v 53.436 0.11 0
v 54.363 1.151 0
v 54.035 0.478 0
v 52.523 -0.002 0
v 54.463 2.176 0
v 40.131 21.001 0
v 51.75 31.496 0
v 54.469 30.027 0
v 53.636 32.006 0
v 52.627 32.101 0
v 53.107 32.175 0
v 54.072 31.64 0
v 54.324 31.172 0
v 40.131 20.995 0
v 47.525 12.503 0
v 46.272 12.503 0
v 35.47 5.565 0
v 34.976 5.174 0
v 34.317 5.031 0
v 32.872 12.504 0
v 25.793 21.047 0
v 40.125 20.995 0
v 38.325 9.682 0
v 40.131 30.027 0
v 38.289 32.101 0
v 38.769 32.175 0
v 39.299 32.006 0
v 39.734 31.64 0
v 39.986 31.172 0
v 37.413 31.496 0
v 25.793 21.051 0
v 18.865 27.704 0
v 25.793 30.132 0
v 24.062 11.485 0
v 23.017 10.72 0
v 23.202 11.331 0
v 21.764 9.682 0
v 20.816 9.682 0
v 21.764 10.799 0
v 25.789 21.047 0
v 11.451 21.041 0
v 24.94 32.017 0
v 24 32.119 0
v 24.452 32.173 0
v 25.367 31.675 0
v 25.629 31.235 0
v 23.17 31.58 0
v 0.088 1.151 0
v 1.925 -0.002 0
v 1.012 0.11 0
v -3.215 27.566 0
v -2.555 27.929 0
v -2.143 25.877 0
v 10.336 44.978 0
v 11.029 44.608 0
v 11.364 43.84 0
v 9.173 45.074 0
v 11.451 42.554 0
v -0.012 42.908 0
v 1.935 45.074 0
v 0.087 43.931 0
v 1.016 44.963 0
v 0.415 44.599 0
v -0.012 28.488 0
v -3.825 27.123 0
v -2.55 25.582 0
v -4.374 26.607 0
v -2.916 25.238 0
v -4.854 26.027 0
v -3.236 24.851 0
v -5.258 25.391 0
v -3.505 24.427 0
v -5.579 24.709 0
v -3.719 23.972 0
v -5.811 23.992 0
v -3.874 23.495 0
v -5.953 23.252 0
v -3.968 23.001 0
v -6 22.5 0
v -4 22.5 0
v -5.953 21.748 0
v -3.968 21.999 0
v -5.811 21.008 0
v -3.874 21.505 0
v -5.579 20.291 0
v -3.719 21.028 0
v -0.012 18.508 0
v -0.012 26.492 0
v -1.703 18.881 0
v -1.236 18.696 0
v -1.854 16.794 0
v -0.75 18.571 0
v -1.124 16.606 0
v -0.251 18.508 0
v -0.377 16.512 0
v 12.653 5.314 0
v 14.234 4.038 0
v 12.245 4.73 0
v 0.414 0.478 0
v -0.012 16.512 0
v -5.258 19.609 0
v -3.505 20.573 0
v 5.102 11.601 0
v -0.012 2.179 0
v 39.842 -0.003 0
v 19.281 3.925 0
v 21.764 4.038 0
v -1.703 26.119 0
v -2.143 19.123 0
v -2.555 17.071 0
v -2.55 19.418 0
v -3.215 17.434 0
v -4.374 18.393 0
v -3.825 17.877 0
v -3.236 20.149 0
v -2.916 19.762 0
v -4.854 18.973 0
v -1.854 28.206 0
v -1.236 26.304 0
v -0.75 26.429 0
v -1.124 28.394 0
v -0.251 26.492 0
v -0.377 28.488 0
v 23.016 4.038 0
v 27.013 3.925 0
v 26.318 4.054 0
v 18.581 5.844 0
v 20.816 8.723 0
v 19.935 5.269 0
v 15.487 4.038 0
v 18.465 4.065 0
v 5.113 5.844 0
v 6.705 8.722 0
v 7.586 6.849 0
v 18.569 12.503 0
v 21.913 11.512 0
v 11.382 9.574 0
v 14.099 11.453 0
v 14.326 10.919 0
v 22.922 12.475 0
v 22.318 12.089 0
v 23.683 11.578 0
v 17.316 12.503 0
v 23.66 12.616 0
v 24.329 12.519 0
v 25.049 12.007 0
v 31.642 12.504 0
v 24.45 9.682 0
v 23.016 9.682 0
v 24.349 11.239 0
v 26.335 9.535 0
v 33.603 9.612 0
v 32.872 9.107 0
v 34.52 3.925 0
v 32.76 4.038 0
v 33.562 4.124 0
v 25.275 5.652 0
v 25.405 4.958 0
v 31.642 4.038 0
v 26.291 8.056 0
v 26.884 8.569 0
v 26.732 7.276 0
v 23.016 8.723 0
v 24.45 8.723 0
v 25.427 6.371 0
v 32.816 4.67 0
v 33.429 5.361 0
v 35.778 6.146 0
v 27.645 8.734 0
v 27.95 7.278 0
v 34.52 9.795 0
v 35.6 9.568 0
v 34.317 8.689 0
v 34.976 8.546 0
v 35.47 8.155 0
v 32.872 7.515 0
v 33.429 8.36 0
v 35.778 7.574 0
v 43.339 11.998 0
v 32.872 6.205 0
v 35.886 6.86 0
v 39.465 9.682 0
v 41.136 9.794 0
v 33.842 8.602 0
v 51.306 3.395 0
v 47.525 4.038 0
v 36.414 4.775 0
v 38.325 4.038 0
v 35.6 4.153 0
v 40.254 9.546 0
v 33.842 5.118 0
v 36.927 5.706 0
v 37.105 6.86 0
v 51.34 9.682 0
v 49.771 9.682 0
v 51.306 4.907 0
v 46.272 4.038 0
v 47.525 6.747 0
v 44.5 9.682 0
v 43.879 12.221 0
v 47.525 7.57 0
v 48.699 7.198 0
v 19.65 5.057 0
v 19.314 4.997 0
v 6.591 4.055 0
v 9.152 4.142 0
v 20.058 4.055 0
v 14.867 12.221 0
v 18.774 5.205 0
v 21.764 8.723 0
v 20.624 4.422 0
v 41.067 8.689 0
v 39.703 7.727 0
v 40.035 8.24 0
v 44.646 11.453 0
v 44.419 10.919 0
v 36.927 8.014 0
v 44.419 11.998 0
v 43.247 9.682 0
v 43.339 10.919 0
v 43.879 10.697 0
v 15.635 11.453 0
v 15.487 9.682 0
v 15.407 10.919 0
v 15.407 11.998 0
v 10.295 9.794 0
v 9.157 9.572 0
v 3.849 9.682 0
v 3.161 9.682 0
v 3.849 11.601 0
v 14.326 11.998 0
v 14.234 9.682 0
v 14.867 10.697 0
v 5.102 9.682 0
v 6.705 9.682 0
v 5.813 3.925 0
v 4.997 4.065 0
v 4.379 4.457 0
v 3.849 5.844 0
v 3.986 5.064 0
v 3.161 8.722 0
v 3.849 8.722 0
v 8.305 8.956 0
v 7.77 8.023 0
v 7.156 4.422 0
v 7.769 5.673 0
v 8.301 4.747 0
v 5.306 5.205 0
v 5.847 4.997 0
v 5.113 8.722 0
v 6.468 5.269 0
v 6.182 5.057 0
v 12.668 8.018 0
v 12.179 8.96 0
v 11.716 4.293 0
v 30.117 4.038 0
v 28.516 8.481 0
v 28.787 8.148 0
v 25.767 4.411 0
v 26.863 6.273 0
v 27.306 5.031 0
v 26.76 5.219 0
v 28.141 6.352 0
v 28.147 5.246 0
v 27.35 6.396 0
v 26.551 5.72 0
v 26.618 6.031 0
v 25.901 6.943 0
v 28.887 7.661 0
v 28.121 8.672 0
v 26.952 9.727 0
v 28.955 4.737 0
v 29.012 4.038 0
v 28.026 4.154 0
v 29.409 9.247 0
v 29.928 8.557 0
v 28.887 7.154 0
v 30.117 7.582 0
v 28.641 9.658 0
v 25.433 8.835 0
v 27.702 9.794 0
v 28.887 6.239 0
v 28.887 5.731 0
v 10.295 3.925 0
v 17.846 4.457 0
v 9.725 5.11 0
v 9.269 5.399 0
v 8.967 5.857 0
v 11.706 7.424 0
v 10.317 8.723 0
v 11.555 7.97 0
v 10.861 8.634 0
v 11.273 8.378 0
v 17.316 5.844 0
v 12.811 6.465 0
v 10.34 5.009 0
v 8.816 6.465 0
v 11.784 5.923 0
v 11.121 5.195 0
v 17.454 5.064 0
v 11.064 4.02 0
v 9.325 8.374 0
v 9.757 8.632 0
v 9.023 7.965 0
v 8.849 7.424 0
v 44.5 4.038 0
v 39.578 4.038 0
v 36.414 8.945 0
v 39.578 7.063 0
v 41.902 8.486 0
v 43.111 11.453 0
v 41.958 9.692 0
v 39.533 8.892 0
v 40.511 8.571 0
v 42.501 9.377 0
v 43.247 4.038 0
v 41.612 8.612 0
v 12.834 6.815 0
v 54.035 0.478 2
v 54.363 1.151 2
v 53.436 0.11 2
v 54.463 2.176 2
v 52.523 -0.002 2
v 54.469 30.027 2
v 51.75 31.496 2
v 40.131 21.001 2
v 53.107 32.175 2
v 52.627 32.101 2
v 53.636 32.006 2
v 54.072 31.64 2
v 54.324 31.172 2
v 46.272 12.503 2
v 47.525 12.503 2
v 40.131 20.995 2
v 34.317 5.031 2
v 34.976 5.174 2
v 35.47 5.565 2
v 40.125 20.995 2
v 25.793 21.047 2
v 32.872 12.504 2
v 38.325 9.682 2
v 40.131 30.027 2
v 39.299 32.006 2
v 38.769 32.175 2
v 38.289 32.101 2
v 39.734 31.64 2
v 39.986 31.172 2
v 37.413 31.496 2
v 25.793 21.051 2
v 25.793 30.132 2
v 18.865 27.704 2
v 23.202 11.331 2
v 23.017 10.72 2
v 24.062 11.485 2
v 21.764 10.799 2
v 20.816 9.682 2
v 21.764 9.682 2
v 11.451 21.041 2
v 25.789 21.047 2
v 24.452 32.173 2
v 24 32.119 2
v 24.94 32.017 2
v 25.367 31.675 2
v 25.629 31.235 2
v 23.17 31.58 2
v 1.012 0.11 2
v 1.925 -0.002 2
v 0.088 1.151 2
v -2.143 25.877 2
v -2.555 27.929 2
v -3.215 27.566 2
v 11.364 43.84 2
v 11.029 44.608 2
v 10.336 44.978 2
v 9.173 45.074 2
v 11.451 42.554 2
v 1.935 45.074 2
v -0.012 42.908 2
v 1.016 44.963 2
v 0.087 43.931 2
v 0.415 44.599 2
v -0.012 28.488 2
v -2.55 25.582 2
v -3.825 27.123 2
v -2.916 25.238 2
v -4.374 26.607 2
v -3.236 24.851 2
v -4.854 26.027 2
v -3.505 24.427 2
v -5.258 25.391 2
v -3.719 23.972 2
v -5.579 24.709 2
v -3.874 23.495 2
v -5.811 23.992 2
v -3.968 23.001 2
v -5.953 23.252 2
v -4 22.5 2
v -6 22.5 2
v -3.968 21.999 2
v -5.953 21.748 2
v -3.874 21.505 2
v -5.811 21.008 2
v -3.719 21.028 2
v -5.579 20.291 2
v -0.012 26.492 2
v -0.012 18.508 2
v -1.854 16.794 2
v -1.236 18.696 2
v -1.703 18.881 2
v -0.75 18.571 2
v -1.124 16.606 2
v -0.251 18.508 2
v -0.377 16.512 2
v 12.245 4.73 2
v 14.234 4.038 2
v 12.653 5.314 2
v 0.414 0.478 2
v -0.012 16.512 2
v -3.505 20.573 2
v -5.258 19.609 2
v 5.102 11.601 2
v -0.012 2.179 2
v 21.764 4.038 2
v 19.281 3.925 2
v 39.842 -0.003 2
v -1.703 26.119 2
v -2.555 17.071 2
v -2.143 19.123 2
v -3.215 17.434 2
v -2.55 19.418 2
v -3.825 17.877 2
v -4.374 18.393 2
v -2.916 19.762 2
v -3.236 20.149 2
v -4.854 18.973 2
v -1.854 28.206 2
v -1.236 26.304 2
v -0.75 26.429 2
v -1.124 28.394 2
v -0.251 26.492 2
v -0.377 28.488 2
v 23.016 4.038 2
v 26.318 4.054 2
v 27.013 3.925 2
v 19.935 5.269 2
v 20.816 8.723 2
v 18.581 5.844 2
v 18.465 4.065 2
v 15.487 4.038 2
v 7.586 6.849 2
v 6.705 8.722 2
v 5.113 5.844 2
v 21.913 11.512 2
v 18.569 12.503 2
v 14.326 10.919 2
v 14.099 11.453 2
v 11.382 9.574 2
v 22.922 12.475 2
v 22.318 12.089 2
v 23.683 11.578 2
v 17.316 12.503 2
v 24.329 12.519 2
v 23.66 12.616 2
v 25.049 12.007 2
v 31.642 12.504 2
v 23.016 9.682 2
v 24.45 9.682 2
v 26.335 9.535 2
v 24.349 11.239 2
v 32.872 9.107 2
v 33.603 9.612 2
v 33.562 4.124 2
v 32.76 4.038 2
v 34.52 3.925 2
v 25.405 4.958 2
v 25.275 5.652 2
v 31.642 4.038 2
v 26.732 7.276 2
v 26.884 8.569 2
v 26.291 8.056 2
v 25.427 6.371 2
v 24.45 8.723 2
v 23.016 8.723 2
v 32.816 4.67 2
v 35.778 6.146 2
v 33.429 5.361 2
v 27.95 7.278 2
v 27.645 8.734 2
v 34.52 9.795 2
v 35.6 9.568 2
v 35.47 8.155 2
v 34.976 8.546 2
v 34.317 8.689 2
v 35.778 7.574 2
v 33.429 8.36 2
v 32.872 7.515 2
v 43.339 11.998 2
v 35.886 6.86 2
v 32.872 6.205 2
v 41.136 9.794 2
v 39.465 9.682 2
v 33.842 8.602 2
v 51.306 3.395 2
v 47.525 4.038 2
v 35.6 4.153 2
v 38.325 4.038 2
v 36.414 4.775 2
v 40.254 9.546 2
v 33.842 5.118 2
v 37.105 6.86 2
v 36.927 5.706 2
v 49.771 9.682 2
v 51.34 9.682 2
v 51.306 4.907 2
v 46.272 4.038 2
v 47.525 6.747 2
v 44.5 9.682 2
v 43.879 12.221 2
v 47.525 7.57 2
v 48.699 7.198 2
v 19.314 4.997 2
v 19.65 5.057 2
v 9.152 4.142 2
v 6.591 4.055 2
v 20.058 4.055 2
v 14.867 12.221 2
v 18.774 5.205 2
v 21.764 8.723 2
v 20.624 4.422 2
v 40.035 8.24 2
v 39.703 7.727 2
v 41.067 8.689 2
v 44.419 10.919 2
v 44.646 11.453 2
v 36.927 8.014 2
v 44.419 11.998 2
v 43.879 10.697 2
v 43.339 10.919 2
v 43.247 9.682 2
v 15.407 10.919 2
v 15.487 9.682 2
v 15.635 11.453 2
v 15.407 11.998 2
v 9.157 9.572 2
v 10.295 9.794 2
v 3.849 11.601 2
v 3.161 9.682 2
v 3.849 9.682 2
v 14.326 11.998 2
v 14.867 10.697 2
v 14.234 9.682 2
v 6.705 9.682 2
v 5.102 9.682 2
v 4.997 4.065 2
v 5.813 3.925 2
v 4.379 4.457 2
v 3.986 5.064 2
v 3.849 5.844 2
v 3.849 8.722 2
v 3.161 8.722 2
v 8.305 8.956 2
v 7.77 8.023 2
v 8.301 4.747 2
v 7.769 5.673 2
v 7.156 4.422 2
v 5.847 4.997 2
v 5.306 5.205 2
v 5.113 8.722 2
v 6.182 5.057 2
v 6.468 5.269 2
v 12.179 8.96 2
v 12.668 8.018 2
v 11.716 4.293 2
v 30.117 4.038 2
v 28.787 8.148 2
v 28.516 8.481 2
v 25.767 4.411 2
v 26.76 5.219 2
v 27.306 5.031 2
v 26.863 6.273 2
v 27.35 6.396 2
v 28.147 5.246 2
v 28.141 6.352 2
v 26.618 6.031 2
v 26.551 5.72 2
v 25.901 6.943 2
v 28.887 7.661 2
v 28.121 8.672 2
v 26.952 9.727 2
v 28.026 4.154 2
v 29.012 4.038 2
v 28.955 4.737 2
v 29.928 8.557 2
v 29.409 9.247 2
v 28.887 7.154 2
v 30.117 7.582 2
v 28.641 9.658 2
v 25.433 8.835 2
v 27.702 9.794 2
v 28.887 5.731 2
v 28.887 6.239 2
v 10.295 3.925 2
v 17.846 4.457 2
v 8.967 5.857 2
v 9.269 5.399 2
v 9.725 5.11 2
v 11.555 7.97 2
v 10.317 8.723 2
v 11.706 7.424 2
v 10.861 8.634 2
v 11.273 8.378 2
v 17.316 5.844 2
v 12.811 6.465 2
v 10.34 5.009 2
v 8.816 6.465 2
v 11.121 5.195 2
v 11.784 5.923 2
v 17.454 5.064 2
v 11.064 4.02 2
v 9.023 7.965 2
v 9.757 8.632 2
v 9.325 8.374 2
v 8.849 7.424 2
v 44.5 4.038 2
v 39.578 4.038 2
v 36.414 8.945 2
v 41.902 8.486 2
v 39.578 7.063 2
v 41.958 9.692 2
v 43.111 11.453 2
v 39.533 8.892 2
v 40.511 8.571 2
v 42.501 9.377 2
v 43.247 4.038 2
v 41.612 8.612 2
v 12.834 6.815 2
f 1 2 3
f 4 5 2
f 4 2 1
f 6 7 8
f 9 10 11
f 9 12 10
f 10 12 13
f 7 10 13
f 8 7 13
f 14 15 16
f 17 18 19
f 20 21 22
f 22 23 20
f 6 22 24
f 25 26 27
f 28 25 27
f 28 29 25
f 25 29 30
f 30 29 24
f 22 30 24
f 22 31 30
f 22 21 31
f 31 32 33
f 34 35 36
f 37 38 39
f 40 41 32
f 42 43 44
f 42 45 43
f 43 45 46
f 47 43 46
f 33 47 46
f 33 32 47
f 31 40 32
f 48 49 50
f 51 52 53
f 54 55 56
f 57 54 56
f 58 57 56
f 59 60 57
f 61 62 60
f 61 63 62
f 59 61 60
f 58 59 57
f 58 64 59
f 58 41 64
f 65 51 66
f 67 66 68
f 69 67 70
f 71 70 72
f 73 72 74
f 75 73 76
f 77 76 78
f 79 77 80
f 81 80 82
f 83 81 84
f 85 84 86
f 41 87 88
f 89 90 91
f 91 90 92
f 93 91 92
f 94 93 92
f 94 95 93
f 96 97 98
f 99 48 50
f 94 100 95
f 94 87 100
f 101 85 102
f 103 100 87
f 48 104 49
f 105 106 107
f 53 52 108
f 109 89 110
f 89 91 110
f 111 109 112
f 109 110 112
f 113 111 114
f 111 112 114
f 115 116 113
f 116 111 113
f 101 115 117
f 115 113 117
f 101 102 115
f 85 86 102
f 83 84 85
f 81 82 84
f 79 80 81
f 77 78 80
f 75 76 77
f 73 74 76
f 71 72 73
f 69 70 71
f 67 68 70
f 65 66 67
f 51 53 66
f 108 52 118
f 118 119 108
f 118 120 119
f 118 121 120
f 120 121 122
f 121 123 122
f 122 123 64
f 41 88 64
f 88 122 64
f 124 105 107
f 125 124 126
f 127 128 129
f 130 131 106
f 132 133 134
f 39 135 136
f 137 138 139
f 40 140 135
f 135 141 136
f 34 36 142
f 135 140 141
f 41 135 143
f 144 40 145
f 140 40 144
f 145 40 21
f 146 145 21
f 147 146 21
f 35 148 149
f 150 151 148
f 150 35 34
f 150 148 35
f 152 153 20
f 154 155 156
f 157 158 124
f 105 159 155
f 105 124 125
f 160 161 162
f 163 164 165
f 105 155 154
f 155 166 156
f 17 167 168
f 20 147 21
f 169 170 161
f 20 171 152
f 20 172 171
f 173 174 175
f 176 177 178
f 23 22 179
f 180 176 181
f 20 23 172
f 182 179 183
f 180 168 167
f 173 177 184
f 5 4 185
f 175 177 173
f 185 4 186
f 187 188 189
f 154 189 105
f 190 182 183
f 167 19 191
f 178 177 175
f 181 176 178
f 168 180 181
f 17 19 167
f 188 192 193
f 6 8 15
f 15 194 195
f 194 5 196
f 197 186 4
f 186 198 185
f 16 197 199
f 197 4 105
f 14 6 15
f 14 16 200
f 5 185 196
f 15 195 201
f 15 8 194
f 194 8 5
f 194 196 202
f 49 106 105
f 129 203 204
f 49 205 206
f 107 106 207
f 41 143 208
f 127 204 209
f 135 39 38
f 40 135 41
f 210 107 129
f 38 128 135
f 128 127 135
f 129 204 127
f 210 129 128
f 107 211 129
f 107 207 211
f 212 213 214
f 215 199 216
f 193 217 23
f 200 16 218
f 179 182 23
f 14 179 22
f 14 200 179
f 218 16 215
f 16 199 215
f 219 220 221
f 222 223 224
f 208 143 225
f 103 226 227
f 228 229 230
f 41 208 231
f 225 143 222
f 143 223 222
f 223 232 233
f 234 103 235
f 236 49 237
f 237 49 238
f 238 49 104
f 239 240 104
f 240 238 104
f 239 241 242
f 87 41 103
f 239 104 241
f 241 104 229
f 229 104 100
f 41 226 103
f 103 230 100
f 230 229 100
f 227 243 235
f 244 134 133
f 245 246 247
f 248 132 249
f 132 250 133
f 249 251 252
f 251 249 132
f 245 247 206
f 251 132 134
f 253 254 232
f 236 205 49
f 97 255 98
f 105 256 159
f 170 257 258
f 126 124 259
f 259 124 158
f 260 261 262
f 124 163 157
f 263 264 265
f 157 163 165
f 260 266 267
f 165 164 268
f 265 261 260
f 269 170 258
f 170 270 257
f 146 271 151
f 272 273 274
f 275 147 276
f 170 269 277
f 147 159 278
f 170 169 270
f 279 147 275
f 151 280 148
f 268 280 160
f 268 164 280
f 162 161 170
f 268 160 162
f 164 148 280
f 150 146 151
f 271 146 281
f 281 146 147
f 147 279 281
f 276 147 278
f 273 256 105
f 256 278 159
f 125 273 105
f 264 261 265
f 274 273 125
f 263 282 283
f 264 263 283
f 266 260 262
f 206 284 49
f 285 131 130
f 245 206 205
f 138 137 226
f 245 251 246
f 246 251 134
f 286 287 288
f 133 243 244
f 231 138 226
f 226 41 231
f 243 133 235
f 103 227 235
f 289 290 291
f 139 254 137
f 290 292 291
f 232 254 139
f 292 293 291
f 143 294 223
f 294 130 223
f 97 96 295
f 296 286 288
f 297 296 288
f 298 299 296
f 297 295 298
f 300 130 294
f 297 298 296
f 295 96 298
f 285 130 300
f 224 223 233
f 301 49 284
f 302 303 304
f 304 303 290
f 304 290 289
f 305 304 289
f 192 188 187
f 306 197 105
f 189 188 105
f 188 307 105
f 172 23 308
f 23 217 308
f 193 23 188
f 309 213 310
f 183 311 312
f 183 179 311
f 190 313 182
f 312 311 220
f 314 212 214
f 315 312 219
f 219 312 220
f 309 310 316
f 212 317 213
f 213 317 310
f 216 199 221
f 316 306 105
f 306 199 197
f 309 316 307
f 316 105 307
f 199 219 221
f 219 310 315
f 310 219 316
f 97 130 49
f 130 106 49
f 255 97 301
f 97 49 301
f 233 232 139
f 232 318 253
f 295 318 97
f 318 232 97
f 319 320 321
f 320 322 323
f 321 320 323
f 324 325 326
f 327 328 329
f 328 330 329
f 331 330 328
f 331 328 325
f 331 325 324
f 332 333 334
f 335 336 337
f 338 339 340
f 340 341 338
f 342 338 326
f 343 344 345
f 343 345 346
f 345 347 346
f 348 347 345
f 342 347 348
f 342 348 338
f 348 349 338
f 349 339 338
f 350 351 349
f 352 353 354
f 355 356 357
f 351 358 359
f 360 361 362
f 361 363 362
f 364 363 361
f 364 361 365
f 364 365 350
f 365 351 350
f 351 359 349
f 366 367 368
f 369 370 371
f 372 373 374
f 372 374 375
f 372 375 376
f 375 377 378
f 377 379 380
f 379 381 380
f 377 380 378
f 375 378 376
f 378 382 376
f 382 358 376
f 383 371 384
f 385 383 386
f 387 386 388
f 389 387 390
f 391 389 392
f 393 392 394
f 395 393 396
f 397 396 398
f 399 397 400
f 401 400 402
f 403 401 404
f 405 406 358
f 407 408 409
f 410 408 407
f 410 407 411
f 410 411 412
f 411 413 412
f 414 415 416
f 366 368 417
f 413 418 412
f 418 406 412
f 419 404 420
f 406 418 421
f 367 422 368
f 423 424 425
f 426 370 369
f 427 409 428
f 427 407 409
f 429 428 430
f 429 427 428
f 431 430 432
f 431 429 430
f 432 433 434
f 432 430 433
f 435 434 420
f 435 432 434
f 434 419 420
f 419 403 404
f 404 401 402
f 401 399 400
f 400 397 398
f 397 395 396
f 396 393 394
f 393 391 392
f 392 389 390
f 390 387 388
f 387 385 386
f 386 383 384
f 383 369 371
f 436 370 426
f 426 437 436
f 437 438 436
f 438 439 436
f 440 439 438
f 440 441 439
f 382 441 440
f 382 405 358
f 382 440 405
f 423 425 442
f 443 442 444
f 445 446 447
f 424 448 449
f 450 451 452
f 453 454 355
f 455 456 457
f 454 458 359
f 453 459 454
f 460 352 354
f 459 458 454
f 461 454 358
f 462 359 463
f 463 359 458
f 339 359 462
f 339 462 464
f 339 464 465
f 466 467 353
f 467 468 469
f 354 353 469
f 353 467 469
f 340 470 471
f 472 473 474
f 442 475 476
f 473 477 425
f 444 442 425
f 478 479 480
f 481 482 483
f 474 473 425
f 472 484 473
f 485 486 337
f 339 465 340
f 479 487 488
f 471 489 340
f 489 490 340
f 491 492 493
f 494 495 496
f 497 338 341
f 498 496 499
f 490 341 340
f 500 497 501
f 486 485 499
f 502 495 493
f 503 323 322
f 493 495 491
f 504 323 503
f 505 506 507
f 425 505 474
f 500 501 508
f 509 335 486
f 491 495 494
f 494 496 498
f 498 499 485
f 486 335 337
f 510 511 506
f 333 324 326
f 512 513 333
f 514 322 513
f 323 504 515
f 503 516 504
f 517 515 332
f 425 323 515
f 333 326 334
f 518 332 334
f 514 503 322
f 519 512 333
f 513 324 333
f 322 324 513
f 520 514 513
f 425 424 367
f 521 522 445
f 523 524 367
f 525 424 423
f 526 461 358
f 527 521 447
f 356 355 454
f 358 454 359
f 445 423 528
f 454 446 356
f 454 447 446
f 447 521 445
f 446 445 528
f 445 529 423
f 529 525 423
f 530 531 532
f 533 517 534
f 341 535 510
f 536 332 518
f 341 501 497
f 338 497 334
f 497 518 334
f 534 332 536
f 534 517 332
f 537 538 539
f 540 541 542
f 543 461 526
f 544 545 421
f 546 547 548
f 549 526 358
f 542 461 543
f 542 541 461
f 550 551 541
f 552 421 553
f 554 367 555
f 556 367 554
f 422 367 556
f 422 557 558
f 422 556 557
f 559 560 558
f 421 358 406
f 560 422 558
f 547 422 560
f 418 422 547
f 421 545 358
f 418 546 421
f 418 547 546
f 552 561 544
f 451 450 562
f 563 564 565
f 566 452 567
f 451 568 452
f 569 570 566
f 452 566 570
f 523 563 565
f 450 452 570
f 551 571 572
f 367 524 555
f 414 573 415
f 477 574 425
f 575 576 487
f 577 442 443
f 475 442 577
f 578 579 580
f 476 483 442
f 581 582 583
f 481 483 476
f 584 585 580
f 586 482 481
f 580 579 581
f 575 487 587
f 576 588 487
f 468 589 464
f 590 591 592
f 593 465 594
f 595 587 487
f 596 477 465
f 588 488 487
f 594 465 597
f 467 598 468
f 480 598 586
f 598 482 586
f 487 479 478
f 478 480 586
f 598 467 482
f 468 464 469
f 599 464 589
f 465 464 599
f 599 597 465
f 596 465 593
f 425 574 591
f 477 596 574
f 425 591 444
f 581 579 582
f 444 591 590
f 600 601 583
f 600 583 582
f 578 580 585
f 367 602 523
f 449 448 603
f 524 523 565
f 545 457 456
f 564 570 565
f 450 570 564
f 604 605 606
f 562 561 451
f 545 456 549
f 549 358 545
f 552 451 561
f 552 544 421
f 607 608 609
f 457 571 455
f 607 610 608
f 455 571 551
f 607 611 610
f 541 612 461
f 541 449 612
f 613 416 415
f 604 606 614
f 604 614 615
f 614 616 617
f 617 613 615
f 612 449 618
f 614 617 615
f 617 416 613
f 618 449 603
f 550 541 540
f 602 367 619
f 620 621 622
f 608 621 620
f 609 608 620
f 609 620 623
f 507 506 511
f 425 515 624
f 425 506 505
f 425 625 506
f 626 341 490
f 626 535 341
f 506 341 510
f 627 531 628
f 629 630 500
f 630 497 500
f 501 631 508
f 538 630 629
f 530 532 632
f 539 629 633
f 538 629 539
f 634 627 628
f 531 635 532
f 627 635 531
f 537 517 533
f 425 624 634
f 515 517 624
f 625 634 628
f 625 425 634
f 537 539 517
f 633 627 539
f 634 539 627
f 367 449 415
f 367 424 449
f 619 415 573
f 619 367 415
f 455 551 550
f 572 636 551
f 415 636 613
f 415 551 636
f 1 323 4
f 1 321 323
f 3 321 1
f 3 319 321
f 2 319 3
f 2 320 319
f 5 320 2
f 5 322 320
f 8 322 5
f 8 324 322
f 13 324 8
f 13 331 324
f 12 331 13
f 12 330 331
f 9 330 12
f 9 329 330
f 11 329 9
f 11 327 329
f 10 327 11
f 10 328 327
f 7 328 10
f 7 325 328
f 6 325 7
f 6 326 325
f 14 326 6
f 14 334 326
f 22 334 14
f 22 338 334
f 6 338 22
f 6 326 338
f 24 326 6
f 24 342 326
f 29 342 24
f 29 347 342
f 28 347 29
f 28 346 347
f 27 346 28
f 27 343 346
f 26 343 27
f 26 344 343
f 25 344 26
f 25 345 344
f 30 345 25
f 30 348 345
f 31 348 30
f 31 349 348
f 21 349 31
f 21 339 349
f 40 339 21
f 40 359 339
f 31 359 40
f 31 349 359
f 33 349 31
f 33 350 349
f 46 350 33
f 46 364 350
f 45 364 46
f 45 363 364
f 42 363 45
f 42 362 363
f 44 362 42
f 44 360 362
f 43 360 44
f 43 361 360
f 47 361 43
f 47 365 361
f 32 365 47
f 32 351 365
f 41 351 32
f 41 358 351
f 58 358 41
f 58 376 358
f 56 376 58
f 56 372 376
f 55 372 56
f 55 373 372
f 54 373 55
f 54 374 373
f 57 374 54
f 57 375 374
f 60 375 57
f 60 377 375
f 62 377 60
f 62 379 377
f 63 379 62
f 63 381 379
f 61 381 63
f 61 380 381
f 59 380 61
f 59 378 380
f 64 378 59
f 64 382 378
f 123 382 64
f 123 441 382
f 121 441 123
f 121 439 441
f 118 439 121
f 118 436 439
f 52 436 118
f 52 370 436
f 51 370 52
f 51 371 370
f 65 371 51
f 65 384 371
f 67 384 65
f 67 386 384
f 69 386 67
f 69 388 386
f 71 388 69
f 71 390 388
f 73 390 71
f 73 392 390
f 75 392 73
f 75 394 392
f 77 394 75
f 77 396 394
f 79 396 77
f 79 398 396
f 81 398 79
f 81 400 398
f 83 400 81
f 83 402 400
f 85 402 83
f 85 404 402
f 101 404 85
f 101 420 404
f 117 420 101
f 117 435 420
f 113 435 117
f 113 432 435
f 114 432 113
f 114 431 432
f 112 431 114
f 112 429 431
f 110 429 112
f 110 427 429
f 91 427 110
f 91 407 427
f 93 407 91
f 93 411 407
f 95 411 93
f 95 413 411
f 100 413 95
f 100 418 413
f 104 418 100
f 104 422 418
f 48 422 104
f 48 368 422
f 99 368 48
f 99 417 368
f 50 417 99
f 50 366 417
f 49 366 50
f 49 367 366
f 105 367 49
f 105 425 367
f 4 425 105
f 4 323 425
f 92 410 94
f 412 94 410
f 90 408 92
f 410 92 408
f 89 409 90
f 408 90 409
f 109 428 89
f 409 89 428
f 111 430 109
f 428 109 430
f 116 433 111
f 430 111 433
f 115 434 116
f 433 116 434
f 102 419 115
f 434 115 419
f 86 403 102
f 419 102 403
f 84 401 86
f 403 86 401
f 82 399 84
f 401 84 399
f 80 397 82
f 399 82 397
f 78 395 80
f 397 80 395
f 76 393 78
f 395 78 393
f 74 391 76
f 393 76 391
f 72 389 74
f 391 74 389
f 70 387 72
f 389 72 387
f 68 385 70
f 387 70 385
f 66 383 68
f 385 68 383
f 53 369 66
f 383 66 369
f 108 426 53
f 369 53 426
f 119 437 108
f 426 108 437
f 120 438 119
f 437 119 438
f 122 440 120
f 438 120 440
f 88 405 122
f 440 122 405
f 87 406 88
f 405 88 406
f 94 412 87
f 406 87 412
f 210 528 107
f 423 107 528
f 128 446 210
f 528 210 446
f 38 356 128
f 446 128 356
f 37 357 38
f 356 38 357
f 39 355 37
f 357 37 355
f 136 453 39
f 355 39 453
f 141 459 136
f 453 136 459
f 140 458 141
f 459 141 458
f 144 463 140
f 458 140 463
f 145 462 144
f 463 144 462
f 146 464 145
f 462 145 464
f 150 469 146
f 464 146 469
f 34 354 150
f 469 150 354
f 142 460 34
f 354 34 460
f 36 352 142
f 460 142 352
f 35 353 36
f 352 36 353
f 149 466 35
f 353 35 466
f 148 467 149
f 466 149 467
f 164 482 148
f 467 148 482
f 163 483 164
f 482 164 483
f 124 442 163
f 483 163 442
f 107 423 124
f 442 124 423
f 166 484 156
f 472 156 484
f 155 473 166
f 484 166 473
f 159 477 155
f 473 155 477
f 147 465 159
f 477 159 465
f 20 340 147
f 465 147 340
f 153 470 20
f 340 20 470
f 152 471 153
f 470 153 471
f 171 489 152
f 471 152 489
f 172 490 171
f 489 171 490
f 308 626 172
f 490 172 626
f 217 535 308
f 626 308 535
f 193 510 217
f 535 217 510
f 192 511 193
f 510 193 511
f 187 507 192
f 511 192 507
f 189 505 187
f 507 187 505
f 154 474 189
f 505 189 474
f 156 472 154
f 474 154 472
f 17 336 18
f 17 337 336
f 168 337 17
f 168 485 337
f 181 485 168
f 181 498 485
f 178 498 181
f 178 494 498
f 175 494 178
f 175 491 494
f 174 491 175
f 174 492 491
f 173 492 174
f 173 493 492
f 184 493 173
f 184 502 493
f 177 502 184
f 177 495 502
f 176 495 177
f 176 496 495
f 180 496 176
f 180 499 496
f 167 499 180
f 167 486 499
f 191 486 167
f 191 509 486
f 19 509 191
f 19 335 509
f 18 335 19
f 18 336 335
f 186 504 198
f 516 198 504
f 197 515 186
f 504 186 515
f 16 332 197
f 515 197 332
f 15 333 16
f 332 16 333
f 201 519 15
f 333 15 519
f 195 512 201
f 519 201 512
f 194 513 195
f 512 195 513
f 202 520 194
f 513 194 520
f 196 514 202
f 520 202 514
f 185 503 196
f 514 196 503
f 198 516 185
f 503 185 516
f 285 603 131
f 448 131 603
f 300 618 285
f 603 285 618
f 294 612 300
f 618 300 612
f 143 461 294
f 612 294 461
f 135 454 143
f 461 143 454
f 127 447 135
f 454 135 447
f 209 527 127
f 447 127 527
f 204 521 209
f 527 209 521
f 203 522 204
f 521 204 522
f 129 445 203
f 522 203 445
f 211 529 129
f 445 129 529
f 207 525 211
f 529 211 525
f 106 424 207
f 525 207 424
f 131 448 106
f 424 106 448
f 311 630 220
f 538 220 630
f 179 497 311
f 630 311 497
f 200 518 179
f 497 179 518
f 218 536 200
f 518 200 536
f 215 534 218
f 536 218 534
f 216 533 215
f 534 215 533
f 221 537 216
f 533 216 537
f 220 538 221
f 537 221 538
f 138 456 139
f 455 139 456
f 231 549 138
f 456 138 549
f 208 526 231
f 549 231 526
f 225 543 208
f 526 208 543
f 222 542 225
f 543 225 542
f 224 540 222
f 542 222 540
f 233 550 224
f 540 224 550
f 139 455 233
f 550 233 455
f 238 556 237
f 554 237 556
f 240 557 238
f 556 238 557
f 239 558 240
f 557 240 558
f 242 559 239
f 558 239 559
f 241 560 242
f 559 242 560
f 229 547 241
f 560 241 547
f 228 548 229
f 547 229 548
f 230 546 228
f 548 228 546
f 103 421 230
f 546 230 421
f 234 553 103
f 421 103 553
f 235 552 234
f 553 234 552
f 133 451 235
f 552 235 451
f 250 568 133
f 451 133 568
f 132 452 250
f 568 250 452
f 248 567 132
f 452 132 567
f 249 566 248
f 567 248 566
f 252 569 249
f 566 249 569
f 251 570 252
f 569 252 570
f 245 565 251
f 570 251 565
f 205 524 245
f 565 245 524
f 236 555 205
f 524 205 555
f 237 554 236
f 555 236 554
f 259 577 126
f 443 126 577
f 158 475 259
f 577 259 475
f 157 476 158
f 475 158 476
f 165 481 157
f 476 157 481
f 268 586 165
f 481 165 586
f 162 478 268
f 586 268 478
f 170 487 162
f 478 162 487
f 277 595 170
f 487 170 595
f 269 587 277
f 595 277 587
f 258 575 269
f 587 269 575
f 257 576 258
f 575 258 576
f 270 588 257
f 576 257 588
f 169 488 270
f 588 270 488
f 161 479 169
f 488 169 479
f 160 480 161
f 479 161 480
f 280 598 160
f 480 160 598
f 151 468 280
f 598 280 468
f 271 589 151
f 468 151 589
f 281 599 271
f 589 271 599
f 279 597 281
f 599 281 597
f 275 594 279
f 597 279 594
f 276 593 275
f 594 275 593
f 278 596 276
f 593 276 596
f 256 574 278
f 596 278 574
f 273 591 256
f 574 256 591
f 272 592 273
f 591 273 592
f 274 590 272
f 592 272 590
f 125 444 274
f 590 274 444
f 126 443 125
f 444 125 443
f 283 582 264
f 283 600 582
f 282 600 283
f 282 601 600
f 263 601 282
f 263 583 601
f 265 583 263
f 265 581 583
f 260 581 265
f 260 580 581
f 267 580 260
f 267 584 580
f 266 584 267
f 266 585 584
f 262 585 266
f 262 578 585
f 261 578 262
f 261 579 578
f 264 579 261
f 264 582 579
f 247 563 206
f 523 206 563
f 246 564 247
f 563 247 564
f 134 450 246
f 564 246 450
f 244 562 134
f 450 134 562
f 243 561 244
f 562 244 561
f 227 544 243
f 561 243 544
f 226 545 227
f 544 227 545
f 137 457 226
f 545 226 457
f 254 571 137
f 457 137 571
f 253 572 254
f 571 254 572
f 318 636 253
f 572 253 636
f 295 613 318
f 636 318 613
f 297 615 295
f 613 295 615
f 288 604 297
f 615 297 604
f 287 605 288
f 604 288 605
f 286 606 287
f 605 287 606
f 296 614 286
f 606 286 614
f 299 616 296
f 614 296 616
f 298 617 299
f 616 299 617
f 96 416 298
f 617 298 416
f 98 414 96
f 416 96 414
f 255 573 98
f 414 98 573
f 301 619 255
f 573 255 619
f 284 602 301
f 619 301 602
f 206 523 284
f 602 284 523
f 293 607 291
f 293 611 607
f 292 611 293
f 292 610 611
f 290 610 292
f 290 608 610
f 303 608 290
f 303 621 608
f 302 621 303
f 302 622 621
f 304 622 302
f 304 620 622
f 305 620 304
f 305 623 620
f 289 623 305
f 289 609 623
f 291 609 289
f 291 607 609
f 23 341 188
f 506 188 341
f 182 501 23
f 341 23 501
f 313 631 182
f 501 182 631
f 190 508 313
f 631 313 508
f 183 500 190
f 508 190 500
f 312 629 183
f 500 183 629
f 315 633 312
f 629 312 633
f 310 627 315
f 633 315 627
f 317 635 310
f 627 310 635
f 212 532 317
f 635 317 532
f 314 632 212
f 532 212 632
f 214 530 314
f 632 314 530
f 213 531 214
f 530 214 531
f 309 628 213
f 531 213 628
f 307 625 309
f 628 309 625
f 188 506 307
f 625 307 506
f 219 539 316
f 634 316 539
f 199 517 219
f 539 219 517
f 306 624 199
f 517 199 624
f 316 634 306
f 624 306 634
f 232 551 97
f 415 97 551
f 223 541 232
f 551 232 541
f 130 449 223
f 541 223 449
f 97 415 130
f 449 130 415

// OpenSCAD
$fn=50;

linear_extrude(height=2) {
    translate([-0.8,-1.2])import("teilfabriko.dxf");
    translate([0,45/2])difference() {
        circle(r=6);
        circle(r=4);
    }
}
